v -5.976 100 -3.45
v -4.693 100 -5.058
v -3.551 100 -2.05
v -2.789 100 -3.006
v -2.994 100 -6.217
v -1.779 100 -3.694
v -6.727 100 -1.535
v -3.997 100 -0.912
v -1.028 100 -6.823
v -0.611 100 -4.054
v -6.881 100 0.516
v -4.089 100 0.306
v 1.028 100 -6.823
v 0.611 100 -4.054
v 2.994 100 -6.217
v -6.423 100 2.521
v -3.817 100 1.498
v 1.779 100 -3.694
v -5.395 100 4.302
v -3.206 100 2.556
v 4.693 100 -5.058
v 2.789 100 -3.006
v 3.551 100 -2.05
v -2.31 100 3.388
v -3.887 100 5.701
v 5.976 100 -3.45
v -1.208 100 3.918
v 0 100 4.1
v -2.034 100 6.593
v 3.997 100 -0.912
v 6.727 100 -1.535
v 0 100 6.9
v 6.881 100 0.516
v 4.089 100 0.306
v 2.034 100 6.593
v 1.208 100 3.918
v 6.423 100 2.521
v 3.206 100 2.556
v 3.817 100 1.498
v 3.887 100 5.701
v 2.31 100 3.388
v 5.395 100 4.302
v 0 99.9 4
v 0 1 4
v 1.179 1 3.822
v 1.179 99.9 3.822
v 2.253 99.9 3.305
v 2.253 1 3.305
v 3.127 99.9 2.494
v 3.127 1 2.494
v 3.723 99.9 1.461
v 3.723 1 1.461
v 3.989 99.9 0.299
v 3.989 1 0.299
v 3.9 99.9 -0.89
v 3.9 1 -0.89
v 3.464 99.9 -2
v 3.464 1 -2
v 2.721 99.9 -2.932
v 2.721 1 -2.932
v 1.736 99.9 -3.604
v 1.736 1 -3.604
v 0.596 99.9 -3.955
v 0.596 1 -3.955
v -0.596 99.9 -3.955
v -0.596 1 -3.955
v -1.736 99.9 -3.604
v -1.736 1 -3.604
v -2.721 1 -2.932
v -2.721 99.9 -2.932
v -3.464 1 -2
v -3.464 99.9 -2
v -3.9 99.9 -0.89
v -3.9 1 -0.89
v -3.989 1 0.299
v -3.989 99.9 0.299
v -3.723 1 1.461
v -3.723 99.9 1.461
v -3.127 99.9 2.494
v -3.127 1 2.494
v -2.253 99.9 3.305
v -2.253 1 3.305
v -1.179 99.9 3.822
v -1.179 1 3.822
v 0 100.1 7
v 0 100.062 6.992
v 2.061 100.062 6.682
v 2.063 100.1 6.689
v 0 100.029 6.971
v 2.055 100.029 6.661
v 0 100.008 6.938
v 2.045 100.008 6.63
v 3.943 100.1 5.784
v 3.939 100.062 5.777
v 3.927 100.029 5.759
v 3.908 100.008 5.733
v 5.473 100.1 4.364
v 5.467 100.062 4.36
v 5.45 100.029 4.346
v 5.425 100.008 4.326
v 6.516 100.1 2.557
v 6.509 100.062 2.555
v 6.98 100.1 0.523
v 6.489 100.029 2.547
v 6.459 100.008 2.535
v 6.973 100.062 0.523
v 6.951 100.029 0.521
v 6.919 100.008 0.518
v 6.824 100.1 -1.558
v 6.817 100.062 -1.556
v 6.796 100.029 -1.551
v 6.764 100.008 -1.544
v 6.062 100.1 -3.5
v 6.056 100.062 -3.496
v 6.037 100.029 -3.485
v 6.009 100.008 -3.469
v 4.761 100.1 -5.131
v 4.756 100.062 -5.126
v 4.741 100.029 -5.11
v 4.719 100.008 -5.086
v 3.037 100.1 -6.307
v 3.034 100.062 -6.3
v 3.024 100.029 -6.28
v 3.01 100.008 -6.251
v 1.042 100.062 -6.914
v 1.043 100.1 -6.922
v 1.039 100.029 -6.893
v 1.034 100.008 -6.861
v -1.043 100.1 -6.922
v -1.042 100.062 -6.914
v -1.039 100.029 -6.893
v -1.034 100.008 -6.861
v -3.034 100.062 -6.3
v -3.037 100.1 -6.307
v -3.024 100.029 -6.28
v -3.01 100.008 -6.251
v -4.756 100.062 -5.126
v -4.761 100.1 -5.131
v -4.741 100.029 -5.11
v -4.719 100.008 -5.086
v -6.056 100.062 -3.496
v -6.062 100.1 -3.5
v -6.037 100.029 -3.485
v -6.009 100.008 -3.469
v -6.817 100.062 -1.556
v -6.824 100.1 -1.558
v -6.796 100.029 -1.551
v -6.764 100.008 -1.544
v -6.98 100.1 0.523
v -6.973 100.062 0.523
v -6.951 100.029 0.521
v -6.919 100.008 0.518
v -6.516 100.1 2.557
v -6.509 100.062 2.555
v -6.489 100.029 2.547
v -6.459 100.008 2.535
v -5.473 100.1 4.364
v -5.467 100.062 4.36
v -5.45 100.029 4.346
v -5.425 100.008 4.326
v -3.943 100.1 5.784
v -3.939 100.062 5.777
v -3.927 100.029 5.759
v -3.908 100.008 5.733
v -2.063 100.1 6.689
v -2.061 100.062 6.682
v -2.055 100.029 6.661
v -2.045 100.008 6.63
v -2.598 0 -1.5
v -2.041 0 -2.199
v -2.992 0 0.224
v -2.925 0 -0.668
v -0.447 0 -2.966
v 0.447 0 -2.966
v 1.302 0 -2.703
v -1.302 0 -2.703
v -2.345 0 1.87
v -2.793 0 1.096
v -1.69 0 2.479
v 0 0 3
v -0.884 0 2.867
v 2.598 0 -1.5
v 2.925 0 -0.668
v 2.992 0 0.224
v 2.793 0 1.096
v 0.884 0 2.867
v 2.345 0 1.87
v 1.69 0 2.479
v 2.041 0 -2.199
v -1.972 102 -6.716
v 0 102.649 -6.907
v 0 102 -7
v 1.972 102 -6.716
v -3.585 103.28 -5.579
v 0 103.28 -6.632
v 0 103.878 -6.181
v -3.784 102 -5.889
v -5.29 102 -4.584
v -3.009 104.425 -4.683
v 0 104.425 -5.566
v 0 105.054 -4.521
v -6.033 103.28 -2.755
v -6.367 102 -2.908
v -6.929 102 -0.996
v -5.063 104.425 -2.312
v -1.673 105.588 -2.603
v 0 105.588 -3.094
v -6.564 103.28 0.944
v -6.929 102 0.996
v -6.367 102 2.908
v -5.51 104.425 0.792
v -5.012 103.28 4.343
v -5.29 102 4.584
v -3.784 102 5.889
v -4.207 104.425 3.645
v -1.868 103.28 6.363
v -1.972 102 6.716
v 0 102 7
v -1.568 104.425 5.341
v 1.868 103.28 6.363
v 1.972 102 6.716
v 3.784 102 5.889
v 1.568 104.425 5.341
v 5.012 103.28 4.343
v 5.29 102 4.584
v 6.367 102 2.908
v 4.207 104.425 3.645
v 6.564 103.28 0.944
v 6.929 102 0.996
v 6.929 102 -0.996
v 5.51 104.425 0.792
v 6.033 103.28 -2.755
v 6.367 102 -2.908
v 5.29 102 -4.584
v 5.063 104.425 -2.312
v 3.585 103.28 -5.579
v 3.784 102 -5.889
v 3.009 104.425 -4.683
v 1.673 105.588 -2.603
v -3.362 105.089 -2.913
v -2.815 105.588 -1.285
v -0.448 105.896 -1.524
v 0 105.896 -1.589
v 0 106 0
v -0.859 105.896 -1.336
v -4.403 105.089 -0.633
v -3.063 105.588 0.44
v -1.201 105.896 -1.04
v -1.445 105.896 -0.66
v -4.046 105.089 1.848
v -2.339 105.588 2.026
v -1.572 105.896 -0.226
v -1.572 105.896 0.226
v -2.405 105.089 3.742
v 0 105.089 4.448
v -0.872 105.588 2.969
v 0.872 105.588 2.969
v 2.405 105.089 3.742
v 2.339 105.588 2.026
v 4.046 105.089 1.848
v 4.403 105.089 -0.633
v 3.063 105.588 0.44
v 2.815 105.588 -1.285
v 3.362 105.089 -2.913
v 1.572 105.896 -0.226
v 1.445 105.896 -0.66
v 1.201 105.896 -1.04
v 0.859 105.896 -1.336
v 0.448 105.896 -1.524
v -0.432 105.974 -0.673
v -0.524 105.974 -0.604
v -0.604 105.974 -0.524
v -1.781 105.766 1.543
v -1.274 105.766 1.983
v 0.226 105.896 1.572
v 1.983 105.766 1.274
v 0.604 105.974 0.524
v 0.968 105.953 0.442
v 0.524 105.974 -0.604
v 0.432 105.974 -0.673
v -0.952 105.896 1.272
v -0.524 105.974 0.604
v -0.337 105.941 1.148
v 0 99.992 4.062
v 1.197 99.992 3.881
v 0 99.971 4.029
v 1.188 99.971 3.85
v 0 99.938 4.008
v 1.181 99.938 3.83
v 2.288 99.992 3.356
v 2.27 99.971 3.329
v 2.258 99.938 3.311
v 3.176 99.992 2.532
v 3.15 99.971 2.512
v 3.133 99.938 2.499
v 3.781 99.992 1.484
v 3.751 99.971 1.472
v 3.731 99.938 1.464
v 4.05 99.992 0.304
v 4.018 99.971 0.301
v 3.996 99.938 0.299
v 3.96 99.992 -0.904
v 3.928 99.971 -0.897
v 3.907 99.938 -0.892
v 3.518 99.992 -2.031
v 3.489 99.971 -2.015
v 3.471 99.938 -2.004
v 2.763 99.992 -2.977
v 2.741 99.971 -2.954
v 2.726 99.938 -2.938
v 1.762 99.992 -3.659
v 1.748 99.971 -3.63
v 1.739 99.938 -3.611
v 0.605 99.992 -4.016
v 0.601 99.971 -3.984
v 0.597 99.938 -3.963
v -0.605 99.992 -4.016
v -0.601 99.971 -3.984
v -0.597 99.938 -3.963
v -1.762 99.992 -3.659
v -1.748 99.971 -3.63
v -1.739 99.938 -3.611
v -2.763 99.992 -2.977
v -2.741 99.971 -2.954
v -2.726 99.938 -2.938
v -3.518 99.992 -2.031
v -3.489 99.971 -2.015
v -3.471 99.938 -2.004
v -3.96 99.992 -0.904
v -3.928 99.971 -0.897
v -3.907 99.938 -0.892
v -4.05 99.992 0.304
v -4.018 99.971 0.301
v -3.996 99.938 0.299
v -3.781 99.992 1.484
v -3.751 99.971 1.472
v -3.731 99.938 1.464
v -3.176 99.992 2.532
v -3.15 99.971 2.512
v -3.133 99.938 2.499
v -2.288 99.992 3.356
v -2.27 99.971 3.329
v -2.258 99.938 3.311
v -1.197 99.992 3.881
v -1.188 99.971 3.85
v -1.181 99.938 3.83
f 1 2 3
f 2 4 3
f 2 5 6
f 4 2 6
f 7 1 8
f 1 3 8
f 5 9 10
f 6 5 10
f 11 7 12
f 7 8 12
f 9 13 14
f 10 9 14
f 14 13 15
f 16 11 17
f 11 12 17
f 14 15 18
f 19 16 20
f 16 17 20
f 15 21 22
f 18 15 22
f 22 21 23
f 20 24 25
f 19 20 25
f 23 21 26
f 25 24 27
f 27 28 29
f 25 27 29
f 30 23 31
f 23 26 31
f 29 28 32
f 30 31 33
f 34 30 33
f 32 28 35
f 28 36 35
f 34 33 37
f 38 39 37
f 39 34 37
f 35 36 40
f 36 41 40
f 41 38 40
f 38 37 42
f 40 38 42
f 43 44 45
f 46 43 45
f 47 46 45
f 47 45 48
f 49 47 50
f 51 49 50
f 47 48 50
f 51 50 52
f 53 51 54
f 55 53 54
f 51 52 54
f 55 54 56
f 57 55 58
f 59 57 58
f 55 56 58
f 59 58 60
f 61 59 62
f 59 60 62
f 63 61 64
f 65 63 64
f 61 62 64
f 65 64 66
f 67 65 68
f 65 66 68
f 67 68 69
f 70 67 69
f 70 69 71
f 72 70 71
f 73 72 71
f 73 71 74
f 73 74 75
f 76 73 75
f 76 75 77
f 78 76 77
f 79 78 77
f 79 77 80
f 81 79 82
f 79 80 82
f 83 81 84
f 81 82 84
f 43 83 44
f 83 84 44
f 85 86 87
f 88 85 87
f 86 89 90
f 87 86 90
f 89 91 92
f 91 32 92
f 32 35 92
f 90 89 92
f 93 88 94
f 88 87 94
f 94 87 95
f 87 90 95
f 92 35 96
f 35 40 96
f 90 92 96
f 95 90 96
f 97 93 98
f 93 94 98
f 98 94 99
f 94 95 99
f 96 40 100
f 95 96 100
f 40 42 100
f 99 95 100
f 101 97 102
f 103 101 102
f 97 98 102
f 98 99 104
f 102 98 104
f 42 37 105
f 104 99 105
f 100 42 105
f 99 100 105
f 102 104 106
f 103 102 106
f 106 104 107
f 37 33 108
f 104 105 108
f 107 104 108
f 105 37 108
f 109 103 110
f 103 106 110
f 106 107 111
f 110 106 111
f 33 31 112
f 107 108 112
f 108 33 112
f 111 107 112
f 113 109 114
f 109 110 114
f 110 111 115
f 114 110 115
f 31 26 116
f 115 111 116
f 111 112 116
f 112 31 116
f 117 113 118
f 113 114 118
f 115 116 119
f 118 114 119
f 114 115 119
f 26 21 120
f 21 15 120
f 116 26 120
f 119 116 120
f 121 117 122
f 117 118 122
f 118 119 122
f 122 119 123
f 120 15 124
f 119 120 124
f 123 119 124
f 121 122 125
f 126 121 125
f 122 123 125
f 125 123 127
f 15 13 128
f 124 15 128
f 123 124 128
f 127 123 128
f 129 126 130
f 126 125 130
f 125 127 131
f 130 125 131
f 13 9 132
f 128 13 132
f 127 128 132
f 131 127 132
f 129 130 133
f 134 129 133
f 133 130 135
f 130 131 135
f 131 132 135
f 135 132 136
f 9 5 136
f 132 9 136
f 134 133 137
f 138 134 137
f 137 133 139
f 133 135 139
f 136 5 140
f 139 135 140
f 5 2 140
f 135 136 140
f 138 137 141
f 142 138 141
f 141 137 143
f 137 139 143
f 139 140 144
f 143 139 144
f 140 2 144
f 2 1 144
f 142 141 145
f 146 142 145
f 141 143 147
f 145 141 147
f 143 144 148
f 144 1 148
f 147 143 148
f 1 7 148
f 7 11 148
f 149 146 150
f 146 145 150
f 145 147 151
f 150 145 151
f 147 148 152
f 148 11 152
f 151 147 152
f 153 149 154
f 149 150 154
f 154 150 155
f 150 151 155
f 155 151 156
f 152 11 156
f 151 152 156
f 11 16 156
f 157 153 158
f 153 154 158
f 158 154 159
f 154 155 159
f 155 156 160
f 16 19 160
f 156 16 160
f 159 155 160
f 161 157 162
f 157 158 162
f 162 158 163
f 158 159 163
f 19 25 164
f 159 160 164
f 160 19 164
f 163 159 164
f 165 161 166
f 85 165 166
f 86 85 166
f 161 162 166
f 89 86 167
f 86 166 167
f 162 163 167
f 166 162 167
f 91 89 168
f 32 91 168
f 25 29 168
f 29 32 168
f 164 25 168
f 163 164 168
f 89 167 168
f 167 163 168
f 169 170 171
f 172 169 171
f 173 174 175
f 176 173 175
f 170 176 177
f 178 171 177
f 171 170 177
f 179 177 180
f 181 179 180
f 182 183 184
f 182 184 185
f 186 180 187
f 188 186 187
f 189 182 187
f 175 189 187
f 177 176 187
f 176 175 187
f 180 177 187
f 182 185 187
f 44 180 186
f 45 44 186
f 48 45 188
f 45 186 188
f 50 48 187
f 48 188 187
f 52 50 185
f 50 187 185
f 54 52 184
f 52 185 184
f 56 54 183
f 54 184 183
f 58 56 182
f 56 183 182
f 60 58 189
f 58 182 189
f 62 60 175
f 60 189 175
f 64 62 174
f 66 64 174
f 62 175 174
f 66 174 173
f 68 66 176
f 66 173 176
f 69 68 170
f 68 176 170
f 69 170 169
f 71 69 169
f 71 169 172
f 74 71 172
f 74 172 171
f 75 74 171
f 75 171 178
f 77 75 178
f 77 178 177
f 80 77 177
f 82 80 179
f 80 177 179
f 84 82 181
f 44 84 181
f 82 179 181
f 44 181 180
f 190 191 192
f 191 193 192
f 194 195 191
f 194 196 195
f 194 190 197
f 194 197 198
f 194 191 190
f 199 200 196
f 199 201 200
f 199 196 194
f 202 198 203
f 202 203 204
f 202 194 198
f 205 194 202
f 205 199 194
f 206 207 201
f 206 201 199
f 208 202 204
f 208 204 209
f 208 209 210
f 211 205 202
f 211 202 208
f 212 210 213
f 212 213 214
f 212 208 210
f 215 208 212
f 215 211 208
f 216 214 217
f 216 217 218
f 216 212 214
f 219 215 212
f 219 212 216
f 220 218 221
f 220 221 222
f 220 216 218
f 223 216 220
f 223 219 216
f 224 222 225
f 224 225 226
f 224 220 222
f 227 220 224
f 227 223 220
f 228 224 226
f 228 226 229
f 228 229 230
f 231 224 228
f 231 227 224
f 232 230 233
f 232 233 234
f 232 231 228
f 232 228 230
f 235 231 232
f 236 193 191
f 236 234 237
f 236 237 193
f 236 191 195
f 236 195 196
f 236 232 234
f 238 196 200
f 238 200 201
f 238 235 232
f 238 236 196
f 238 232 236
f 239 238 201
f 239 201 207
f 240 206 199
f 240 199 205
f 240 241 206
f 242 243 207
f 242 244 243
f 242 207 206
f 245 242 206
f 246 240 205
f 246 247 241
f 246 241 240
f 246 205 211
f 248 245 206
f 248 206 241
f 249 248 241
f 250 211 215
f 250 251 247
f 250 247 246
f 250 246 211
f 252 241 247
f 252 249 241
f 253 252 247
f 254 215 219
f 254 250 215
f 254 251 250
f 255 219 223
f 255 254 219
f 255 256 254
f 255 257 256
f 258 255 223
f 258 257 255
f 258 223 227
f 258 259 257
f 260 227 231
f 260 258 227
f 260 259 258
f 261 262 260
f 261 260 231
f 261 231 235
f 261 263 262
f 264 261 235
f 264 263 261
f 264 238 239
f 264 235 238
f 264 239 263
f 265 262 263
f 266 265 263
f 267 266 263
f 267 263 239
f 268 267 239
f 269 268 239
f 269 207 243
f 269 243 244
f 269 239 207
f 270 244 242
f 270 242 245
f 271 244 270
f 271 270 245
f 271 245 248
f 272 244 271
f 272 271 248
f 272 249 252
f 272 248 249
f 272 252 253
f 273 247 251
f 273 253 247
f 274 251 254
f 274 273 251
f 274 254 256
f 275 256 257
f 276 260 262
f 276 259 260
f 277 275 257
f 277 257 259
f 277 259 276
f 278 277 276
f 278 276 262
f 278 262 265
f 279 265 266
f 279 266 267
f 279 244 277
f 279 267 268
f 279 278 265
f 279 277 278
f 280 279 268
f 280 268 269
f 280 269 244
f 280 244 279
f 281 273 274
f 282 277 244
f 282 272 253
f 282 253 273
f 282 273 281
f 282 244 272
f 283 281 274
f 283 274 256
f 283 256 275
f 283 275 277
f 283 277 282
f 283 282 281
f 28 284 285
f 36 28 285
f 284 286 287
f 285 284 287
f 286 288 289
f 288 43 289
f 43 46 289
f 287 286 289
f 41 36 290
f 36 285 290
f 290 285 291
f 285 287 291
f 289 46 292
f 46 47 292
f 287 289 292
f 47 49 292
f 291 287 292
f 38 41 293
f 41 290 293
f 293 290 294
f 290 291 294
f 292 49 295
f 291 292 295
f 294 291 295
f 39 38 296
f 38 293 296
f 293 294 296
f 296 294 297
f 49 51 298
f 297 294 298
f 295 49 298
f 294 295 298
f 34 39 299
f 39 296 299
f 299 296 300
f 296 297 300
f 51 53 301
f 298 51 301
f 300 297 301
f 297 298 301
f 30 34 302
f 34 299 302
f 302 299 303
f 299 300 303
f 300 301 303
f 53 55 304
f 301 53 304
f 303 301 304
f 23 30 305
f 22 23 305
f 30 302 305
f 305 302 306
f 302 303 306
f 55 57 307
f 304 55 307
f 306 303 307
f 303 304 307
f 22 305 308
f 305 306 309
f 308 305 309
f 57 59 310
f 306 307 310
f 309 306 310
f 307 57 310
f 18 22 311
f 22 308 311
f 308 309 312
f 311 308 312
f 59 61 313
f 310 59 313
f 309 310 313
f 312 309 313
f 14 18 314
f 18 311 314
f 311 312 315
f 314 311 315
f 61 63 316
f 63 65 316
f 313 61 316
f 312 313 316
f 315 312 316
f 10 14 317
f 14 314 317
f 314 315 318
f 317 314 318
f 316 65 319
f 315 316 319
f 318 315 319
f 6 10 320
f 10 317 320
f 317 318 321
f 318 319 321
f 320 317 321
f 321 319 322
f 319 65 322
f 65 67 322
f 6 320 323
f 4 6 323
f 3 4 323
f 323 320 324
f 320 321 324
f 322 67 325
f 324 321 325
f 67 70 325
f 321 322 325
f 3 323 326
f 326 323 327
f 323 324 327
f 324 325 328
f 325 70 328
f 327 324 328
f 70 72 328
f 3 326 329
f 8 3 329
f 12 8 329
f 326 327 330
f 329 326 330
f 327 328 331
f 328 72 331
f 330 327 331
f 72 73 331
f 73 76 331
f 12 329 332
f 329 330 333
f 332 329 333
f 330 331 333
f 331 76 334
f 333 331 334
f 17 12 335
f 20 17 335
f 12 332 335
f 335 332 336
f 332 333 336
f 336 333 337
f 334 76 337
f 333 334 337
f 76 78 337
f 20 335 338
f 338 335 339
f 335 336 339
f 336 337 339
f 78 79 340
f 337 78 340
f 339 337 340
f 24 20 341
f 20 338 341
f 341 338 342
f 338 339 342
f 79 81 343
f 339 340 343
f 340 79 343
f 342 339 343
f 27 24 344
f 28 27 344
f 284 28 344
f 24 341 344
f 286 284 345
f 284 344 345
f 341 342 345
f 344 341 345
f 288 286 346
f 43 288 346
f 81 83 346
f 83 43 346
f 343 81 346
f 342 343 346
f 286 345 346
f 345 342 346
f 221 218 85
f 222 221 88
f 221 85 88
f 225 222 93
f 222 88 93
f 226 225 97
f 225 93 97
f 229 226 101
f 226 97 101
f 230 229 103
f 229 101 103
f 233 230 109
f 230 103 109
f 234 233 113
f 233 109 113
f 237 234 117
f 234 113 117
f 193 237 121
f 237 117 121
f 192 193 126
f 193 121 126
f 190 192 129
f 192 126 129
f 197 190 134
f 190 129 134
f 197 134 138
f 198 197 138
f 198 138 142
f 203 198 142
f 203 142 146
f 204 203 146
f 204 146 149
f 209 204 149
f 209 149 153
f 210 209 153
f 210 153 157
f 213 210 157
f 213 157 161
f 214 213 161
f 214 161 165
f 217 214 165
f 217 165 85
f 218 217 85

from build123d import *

# Parameters (mm, degrees)
SKETCH1_R           = 4
BOSS_EXTRUDE1_DEPTH = 100
SKETCH2_R           = 7
BOSS_EXTRUDE2_DEPTH = 2
DOME1_FACE_RADIUS   = 7
DOME1_HEIGHT        = 4
FILLET1_R           = 0.1
CHAMFER1_SIZE       = 1


with BuildPart() as part:
    # Sketch1 → Boss-Extrude1 (new body)
    with BuildSketch(Plane(origin=(0, 0, 0), x_dir=(1, 0, 0), z_dir=(0, 1, 0))):
        Circle(SKETCH1_R)
    extrude(amount=BOSS_EXTRUDE1_DEPTH)

    # Sketch2 → Boss-Extrude2 (add)
    with BuildSketch(Plane(origin=(0, 100, 0), x_dir=(1, 0, 0), z_dir=(0, 1, 0))):
        Circle(SKETCH2_R)
    extrude(amount=BOSS_EXTRUDE2_DEPTH)

    # Dome1: an elliptical dome of height H over a round flat face of radius A is half a spheroid: the quarter ellipse of half axes A and H revolved about the face's axis
    with BuildSketch(Plane((0, 102, 0), x_dir=(0, 0, -1), z_dir=(1, 0, 0)), mode=Mode.PRIVATE) as dome1_quarter:
        Ellipse(DOME1_FACE_RADIUS, DOME1_HEIGHT)
        Rectangle(DOME1_FACE_RADIUS, DOME1_HEIGHT, align=(Align.MIN, Align.MIN), mode=Mode.INTERSECT)
    revolve(dome1_quarter.sketch, axis=Axis((0, 102, 0), (0, 1, 0)))

    # Fillet1
    fillet1_edges = [part.edges().sort_by_distance(p)[0] for p in [
        (-7, 100, 0),
        (-4, 100, 0),
    ]]
    fillet(fillet1_edges, radius=FILLET1_R)

    # Chamfer1
    chamfer1_edges = [part.edges().sort_by_distance(p)[0] for p in [
        (-4, 0, 0),
    ]]
    chamfer(chamfer1_edges, length=CHAMFER1_SIZE)


solid = part.part
